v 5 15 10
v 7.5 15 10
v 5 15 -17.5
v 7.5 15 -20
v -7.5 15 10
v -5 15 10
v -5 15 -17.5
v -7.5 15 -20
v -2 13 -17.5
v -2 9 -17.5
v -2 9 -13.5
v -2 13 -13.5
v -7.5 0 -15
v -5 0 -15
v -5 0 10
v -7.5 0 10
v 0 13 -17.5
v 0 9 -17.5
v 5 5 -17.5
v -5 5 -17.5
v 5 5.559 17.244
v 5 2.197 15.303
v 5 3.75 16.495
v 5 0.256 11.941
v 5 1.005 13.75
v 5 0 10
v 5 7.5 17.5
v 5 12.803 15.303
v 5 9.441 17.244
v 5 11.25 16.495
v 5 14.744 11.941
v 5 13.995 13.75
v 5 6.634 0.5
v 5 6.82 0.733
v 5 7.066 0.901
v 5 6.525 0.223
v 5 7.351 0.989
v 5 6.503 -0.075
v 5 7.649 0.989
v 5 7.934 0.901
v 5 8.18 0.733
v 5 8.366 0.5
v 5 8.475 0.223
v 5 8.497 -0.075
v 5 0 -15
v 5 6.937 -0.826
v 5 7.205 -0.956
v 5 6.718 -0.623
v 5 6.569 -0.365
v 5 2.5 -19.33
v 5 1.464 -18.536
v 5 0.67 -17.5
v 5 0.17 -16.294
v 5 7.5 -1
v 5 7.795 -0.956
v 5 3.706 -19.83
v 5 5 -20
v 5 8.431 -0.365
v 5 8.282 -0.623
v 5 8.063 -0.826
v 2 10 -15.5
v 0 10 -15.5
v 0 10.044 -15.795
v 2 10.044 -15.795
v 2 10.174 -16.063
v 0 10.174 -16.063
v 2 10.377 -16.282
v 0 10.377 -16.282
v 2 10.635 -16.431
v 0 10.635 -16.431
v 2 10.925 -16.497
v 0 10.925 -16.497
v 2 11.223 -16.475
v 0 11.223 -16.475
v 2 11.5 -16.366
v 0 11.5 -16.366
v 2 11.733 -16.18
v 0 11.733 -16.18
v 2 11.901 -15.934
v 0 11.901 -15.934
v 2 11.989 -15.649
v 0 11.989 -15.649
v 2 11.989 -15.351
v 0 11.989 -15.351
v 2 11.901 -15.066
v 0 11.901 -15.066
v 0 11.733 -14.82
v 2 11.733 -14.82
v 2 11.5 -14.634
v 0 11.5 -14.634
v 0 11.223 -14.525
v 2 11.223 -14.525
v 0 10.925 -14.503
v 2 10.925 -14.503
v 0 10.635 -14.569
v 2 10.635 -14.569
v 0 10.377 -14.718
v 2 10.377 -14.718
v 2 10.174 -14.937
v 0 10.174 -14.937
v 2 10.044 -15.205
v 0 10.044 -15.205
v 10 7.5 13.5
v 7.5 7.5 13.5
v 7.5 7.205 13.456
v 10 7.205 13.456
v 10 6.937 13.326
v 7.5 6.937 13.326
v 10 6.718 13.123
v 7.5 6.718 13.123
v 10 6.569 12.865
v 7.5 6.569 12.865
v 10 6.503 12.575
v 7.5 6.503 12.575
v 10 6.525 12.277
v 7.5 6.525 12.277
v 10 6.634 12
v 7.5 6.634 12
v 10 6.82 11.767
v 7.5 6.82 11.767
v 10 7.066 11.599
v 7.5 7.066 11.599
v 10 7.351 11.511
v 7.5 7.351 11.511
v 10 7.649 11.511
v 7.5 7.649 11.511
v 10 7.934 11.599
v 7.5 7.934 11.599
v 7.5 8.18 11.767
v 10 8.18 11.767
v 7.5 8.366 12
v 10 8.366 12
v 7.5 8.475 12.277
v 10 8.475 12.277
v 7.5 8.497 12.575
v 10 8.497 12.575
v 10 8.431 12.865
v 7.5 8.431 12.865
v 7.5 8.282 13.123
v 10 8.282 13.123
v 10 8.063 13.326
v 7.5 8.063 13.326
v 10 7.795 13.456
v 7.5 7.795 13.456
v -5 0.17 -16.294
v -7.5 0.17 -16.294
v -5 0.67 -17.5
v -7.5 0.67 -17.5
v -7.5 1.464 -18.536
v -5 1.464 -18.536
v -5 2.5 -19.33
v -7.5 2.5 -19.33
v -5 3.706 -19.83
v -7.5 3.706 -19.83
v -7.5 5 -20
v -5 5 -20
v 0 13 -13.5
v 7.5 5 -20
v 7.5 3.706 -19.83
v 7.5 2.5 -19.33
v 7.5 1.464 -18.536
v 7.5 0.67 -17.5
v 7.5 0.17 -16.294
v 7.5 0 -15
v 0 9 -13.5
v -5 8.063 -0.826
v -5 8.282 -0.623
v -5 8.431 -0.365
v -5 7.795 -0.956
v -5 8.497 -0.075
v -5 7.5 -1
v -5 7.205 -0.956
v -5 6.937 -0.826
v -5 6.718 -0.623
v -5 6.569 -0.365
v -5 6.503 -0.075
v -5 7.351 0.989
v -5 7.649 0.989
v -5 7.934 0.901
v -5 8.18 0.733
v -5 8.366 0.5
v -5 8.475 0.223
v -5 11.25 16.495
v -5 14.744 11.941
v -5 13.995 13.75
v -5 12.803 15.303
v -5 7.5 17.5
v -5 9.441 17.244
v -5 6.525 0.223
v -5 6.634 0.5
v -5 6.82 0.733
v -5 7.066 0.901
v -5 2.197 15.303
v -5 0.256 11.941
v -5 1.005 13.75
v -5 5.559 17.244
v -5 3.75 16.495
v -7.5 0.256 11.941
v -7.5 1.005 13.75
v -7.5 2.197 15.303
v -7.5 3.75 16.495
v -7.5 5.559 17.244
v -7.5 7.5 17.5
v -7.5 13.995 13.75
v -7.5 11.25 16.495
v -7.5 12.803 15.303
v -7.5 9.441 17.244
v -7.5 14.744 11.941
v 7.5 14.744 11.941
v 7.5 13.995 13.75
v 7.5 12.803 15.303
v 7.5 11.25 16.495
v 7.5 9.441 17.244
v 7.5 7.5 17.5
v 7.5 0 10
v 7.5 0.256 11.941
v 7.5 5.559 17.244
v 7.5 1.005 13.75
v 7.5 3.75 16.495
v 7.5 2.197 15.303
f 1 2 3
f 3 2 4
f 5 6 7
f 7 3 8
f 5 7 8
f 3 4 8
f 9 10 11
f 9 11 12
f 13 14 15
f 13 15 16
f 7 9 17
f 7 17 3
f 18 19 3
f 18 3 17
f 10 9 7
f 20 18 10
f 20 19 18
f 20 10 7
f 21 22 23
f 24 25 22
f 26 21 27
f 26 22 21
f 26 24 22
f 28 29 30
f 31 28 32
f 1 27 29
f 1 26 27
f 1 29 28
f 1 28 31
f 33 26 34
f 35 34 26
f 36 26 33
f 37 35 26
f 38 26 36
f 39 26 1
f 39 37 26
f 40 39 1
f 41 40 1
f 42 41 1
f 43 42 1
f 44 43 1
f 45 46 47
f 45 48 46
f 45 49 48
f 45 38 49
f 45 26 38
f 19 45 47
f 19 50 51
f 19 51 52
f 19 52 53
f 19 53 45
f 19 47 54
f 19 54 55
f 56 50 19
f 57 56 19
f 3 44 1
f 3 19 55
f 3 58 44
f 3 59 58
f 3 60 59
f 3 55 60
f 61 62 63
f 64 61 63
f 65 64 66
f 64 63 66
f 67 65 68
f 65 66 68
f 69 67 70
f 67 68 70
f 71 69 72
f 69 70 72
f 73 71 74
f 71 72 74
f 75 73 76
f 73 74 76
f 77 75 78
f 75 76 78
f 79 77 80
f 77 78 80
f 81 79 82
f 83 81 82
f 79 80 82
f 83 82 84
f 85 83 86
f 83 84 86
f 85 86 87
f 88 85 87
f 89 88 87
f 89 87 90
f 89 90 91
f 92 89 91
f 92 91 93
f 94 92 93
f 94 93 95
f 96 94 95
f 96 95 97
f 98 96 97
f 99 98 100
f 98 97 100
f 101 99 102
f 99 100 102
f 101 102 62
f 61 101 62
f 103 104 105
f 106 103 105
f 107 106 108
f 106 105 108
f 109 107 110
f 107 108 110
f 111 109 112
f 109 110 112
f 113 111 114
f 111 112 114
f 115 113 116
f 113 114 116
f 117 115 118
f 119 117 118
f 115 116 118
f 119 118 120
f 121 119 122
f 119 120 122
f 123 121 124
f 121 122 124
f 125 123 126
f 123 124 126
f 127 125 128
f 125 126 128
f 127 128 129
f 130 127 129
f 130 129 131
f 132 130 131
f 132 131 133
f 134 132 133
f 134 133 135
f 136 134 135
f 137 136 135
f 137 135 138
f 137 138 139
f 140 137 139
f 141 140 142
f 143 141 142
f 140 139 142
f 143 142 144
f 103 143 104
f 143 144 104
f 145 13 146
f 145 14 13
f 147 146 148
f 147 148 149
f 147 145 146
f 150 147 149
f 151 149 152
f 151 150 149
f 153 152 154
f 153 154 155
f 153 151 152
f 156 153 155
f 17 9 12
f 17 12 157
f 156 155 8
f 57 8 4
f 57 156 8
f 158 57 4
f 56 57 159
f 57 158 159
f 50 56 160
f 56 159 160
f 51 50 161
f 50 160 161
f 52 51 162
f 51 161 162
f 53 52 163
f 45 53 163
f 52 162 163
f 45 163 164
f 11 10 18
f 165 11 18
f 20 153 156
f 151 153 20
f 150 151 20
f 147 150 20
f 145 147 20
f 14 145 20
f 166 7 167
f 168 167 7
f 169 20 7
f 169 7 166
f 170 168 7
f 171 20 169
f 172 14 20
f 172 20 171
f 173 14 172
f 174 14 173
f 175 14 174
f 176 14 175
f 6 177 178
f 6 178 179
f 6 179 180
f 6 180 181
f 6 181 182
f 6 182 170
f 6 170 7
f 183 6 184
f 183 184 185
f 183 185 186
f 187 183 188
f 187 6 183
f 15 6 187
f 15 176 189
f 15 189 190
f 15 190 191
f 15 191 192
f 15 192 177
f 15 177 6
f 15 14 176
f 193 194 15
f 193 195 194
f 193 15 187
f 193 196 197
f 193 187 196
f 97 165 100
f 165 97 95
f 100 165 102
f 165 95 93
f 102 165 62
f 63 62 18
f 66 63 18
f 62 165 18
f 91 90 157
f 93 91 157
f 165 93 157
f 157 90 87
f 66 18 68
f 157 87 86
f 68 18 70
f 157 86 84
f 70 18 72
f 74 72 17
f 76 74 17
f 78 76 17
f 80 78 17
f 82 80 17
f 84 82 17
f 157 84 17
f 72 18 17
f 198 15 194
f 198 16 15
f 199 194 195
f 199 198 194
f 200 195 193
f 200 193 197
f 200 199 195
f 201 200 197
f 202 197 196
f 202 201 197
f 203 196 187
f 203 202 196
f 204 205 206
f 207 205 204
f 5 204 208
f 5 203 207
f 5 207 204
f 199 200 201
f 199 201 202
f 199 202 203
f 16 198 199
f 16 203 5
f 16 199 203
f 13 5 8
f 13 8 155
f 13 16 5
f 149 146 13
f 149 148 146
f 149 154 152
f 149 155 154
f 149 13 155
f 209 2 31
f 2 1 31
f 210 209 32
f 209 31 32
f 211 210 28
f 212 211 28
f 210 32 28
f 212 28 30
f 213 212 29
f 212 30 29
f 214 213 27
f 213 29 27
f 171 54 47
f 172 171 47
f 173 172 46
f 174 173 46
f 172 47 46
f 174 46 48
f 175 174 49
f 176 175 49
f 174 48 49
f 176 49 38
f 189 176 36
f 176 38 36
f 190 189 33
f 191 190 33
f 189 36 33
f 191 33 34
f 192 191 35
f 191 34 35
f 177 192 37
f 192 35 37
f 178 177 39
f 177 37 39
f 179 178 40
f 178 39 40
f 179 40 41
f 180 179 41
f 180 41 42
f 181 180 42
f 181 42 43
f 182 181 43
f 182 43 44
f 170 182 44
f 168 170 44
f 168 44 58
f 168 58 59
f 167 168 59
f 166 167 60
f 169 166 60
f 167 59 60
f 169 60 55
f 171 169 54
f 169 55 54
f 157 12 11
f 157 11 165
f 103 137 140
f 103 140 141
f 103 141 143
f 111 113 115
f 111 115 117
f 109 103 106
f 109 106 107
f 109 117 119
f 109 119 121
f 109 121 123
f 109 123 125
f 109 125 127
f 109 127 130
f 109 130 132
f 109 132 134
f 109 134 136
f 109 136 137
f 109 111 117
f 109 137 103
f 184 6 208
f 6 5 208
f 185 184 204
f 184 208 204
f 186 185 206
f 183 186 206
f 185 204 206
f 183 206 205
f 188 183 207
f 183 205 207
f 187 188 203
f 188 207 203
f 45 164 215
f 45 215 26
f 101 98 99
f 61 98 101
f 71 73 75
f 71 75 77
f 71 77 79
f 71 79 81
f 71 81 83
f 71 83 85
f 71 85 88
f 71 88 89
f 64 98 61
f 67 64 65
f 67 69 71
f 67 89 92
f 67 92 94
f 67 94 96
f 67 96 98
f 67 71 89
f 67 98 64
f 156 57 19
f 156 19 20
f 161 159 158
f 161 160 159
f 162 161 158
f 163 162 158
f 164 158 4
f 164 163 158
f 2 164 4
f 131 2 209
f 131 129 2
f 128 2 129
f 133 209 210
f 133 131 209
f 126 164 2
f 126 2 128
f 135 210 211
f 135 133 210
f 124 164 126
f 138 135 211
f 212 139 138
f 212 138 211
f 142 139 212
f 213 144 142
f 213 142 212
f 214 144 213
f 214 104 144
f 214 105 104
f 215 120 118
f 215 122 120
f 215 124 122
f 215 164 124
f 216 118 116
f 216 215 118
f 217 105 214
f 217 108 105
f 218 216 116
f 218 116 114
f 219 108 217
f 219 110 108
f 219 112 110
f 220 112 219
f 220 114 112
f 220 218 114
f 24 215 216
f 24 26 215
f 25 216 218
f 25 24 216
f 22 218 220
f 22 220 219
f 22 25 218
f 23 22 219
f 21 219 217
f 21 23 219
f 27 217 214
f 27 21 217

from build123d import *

# Parameters (mm, degrees)
BOSS_EXTRUDE1_DEPTH = 15
SKETCH4_R           = 1
BOSS_EXTRUDE3_DEPTH = 10
SKETCH5_R           = 1
BOSS_EXTRUDE4_DEPTH = 2.5
CUT_EXTRUDE1_REACH  = 43.608
SKETCH6_W           = 10
SKETCH6_H           = 5
FILLET1_R           = 7.5
FILLET2_R           = 5
SKETCH7_W           = 2
SKETCH7_H           = 4
BOSS_EXTRUDE5_DEPTH = 4
SKETCH8_R           = 1
BOSS_EXTRUDE6_DEPTH = 2


with BuildPart() as part:
    # Sketch1 → Boss-Extrude1 (new body)
    with BuildSketch(Plane(origin=(0, 0, 0), x_dir=(1, 0, 0), z_dir=(0, 1, 0))):
        Polygon((-7.5, -17.5), (-7.5, 20), (7.5, 20), (7.5, -17.5), (5, -17.5), (5, 17.5), (-5, 17.5), (-5, -17.5), align=None)
    extrude(amount=BOSS_EXTRUDE1_DEPTH)

    # Sketch4 → Boss-Extrude3 (add)
    with BuildSketch(Plane.ZY.offset(-5)):
        with Locations(Location((0, 7.5, 0), (0, 0, 180))):
            Circle(SKETCH4_R)
    extrude(amount=BOSS_EXTRUDE3_DEPTH)

    # Sketch5 → Boss-Extrude4 (add)
    with BuildSketch(Plane(origin=(7.5, 0, 0), x_dir=(0, 0, -1), z_dir=(1, 0, 0))):
        with Locations(Location((-12.5, 7.5, 0), (0, 0, 180))):
            Circle(SKETCH5_R)
    extrude(amount=BOSS_EXTRUDE4_DEPTH)

    # Sketch6 → Cut-Extrude1 (cut, up to next)
    with BuildSketch(Plane(origin=(0, 0, -20), x_dir=(-1, 0, 0), z_dir=(0, 0, -1)), mode=Mode.PRIVATE) as cut_extrude1_sk1:
        with Locations((0, 2.5)):
            Rectangle(SKETCH6_W, SKETCH6_H)
    cut_extrude1_tool1 = extrude(cut_extrude1_sk1.sketch, amount=-CUT_EXTRUDE1_REACH, mode=Mode.PRIVATE) & part.part
    add(cut_extrude1_tool1.solids().sort_by_distance((0, 2.5, -20))[0], mode=Mode.SUBTRACT)

    # Fillet1
    fillet1_edges = [part.edges().sort_by_distance(p)[0] for p in [
        (-6.25, 0, 17.5),
        (-6.25, 15, 17.5),
        (6.25, 0, 17.5),
        (6.25, 15, 17.5),
    ]]
    fillet(fillet1_edges, radius=FILLET1_R - 0.0001)  # a hair under: the kernel refuses the full size

    # Fillet2
    fillet2_edges = [part.edges().sort_by_distance(p)[0] for p in [
        (6.25, 0, -20),
        (-6.25, 0, -20),
    ]]
    fillet(fillet2_edges, radius=FILLET2_R)

    # Sketch7 → Boss-Extrude5 (add)
    with BuildSketch(Plane.XY.offset(-17.5)):
        with Locations((-1, 11)):
            Rectangle(SKETCH7_W, SKETCH7_H)
    extrude(amount=BOSS_EXTRUDE5_DEPTH)

    # Sketch8 → Boss-Extrude6 (add)
    with BuildSketch(Plane(origin=(0, 0, 0), x_dir=(0, 0, -1), z_dir=(1, 0, 0))):
        with Locations(Location((15.5, 11, 0), (0, 0, 270))):
            Circle(SKETCH8_R)
    extrude(amount=BOSS_EXTRUDE6_DEPTH)


solid = part.part
